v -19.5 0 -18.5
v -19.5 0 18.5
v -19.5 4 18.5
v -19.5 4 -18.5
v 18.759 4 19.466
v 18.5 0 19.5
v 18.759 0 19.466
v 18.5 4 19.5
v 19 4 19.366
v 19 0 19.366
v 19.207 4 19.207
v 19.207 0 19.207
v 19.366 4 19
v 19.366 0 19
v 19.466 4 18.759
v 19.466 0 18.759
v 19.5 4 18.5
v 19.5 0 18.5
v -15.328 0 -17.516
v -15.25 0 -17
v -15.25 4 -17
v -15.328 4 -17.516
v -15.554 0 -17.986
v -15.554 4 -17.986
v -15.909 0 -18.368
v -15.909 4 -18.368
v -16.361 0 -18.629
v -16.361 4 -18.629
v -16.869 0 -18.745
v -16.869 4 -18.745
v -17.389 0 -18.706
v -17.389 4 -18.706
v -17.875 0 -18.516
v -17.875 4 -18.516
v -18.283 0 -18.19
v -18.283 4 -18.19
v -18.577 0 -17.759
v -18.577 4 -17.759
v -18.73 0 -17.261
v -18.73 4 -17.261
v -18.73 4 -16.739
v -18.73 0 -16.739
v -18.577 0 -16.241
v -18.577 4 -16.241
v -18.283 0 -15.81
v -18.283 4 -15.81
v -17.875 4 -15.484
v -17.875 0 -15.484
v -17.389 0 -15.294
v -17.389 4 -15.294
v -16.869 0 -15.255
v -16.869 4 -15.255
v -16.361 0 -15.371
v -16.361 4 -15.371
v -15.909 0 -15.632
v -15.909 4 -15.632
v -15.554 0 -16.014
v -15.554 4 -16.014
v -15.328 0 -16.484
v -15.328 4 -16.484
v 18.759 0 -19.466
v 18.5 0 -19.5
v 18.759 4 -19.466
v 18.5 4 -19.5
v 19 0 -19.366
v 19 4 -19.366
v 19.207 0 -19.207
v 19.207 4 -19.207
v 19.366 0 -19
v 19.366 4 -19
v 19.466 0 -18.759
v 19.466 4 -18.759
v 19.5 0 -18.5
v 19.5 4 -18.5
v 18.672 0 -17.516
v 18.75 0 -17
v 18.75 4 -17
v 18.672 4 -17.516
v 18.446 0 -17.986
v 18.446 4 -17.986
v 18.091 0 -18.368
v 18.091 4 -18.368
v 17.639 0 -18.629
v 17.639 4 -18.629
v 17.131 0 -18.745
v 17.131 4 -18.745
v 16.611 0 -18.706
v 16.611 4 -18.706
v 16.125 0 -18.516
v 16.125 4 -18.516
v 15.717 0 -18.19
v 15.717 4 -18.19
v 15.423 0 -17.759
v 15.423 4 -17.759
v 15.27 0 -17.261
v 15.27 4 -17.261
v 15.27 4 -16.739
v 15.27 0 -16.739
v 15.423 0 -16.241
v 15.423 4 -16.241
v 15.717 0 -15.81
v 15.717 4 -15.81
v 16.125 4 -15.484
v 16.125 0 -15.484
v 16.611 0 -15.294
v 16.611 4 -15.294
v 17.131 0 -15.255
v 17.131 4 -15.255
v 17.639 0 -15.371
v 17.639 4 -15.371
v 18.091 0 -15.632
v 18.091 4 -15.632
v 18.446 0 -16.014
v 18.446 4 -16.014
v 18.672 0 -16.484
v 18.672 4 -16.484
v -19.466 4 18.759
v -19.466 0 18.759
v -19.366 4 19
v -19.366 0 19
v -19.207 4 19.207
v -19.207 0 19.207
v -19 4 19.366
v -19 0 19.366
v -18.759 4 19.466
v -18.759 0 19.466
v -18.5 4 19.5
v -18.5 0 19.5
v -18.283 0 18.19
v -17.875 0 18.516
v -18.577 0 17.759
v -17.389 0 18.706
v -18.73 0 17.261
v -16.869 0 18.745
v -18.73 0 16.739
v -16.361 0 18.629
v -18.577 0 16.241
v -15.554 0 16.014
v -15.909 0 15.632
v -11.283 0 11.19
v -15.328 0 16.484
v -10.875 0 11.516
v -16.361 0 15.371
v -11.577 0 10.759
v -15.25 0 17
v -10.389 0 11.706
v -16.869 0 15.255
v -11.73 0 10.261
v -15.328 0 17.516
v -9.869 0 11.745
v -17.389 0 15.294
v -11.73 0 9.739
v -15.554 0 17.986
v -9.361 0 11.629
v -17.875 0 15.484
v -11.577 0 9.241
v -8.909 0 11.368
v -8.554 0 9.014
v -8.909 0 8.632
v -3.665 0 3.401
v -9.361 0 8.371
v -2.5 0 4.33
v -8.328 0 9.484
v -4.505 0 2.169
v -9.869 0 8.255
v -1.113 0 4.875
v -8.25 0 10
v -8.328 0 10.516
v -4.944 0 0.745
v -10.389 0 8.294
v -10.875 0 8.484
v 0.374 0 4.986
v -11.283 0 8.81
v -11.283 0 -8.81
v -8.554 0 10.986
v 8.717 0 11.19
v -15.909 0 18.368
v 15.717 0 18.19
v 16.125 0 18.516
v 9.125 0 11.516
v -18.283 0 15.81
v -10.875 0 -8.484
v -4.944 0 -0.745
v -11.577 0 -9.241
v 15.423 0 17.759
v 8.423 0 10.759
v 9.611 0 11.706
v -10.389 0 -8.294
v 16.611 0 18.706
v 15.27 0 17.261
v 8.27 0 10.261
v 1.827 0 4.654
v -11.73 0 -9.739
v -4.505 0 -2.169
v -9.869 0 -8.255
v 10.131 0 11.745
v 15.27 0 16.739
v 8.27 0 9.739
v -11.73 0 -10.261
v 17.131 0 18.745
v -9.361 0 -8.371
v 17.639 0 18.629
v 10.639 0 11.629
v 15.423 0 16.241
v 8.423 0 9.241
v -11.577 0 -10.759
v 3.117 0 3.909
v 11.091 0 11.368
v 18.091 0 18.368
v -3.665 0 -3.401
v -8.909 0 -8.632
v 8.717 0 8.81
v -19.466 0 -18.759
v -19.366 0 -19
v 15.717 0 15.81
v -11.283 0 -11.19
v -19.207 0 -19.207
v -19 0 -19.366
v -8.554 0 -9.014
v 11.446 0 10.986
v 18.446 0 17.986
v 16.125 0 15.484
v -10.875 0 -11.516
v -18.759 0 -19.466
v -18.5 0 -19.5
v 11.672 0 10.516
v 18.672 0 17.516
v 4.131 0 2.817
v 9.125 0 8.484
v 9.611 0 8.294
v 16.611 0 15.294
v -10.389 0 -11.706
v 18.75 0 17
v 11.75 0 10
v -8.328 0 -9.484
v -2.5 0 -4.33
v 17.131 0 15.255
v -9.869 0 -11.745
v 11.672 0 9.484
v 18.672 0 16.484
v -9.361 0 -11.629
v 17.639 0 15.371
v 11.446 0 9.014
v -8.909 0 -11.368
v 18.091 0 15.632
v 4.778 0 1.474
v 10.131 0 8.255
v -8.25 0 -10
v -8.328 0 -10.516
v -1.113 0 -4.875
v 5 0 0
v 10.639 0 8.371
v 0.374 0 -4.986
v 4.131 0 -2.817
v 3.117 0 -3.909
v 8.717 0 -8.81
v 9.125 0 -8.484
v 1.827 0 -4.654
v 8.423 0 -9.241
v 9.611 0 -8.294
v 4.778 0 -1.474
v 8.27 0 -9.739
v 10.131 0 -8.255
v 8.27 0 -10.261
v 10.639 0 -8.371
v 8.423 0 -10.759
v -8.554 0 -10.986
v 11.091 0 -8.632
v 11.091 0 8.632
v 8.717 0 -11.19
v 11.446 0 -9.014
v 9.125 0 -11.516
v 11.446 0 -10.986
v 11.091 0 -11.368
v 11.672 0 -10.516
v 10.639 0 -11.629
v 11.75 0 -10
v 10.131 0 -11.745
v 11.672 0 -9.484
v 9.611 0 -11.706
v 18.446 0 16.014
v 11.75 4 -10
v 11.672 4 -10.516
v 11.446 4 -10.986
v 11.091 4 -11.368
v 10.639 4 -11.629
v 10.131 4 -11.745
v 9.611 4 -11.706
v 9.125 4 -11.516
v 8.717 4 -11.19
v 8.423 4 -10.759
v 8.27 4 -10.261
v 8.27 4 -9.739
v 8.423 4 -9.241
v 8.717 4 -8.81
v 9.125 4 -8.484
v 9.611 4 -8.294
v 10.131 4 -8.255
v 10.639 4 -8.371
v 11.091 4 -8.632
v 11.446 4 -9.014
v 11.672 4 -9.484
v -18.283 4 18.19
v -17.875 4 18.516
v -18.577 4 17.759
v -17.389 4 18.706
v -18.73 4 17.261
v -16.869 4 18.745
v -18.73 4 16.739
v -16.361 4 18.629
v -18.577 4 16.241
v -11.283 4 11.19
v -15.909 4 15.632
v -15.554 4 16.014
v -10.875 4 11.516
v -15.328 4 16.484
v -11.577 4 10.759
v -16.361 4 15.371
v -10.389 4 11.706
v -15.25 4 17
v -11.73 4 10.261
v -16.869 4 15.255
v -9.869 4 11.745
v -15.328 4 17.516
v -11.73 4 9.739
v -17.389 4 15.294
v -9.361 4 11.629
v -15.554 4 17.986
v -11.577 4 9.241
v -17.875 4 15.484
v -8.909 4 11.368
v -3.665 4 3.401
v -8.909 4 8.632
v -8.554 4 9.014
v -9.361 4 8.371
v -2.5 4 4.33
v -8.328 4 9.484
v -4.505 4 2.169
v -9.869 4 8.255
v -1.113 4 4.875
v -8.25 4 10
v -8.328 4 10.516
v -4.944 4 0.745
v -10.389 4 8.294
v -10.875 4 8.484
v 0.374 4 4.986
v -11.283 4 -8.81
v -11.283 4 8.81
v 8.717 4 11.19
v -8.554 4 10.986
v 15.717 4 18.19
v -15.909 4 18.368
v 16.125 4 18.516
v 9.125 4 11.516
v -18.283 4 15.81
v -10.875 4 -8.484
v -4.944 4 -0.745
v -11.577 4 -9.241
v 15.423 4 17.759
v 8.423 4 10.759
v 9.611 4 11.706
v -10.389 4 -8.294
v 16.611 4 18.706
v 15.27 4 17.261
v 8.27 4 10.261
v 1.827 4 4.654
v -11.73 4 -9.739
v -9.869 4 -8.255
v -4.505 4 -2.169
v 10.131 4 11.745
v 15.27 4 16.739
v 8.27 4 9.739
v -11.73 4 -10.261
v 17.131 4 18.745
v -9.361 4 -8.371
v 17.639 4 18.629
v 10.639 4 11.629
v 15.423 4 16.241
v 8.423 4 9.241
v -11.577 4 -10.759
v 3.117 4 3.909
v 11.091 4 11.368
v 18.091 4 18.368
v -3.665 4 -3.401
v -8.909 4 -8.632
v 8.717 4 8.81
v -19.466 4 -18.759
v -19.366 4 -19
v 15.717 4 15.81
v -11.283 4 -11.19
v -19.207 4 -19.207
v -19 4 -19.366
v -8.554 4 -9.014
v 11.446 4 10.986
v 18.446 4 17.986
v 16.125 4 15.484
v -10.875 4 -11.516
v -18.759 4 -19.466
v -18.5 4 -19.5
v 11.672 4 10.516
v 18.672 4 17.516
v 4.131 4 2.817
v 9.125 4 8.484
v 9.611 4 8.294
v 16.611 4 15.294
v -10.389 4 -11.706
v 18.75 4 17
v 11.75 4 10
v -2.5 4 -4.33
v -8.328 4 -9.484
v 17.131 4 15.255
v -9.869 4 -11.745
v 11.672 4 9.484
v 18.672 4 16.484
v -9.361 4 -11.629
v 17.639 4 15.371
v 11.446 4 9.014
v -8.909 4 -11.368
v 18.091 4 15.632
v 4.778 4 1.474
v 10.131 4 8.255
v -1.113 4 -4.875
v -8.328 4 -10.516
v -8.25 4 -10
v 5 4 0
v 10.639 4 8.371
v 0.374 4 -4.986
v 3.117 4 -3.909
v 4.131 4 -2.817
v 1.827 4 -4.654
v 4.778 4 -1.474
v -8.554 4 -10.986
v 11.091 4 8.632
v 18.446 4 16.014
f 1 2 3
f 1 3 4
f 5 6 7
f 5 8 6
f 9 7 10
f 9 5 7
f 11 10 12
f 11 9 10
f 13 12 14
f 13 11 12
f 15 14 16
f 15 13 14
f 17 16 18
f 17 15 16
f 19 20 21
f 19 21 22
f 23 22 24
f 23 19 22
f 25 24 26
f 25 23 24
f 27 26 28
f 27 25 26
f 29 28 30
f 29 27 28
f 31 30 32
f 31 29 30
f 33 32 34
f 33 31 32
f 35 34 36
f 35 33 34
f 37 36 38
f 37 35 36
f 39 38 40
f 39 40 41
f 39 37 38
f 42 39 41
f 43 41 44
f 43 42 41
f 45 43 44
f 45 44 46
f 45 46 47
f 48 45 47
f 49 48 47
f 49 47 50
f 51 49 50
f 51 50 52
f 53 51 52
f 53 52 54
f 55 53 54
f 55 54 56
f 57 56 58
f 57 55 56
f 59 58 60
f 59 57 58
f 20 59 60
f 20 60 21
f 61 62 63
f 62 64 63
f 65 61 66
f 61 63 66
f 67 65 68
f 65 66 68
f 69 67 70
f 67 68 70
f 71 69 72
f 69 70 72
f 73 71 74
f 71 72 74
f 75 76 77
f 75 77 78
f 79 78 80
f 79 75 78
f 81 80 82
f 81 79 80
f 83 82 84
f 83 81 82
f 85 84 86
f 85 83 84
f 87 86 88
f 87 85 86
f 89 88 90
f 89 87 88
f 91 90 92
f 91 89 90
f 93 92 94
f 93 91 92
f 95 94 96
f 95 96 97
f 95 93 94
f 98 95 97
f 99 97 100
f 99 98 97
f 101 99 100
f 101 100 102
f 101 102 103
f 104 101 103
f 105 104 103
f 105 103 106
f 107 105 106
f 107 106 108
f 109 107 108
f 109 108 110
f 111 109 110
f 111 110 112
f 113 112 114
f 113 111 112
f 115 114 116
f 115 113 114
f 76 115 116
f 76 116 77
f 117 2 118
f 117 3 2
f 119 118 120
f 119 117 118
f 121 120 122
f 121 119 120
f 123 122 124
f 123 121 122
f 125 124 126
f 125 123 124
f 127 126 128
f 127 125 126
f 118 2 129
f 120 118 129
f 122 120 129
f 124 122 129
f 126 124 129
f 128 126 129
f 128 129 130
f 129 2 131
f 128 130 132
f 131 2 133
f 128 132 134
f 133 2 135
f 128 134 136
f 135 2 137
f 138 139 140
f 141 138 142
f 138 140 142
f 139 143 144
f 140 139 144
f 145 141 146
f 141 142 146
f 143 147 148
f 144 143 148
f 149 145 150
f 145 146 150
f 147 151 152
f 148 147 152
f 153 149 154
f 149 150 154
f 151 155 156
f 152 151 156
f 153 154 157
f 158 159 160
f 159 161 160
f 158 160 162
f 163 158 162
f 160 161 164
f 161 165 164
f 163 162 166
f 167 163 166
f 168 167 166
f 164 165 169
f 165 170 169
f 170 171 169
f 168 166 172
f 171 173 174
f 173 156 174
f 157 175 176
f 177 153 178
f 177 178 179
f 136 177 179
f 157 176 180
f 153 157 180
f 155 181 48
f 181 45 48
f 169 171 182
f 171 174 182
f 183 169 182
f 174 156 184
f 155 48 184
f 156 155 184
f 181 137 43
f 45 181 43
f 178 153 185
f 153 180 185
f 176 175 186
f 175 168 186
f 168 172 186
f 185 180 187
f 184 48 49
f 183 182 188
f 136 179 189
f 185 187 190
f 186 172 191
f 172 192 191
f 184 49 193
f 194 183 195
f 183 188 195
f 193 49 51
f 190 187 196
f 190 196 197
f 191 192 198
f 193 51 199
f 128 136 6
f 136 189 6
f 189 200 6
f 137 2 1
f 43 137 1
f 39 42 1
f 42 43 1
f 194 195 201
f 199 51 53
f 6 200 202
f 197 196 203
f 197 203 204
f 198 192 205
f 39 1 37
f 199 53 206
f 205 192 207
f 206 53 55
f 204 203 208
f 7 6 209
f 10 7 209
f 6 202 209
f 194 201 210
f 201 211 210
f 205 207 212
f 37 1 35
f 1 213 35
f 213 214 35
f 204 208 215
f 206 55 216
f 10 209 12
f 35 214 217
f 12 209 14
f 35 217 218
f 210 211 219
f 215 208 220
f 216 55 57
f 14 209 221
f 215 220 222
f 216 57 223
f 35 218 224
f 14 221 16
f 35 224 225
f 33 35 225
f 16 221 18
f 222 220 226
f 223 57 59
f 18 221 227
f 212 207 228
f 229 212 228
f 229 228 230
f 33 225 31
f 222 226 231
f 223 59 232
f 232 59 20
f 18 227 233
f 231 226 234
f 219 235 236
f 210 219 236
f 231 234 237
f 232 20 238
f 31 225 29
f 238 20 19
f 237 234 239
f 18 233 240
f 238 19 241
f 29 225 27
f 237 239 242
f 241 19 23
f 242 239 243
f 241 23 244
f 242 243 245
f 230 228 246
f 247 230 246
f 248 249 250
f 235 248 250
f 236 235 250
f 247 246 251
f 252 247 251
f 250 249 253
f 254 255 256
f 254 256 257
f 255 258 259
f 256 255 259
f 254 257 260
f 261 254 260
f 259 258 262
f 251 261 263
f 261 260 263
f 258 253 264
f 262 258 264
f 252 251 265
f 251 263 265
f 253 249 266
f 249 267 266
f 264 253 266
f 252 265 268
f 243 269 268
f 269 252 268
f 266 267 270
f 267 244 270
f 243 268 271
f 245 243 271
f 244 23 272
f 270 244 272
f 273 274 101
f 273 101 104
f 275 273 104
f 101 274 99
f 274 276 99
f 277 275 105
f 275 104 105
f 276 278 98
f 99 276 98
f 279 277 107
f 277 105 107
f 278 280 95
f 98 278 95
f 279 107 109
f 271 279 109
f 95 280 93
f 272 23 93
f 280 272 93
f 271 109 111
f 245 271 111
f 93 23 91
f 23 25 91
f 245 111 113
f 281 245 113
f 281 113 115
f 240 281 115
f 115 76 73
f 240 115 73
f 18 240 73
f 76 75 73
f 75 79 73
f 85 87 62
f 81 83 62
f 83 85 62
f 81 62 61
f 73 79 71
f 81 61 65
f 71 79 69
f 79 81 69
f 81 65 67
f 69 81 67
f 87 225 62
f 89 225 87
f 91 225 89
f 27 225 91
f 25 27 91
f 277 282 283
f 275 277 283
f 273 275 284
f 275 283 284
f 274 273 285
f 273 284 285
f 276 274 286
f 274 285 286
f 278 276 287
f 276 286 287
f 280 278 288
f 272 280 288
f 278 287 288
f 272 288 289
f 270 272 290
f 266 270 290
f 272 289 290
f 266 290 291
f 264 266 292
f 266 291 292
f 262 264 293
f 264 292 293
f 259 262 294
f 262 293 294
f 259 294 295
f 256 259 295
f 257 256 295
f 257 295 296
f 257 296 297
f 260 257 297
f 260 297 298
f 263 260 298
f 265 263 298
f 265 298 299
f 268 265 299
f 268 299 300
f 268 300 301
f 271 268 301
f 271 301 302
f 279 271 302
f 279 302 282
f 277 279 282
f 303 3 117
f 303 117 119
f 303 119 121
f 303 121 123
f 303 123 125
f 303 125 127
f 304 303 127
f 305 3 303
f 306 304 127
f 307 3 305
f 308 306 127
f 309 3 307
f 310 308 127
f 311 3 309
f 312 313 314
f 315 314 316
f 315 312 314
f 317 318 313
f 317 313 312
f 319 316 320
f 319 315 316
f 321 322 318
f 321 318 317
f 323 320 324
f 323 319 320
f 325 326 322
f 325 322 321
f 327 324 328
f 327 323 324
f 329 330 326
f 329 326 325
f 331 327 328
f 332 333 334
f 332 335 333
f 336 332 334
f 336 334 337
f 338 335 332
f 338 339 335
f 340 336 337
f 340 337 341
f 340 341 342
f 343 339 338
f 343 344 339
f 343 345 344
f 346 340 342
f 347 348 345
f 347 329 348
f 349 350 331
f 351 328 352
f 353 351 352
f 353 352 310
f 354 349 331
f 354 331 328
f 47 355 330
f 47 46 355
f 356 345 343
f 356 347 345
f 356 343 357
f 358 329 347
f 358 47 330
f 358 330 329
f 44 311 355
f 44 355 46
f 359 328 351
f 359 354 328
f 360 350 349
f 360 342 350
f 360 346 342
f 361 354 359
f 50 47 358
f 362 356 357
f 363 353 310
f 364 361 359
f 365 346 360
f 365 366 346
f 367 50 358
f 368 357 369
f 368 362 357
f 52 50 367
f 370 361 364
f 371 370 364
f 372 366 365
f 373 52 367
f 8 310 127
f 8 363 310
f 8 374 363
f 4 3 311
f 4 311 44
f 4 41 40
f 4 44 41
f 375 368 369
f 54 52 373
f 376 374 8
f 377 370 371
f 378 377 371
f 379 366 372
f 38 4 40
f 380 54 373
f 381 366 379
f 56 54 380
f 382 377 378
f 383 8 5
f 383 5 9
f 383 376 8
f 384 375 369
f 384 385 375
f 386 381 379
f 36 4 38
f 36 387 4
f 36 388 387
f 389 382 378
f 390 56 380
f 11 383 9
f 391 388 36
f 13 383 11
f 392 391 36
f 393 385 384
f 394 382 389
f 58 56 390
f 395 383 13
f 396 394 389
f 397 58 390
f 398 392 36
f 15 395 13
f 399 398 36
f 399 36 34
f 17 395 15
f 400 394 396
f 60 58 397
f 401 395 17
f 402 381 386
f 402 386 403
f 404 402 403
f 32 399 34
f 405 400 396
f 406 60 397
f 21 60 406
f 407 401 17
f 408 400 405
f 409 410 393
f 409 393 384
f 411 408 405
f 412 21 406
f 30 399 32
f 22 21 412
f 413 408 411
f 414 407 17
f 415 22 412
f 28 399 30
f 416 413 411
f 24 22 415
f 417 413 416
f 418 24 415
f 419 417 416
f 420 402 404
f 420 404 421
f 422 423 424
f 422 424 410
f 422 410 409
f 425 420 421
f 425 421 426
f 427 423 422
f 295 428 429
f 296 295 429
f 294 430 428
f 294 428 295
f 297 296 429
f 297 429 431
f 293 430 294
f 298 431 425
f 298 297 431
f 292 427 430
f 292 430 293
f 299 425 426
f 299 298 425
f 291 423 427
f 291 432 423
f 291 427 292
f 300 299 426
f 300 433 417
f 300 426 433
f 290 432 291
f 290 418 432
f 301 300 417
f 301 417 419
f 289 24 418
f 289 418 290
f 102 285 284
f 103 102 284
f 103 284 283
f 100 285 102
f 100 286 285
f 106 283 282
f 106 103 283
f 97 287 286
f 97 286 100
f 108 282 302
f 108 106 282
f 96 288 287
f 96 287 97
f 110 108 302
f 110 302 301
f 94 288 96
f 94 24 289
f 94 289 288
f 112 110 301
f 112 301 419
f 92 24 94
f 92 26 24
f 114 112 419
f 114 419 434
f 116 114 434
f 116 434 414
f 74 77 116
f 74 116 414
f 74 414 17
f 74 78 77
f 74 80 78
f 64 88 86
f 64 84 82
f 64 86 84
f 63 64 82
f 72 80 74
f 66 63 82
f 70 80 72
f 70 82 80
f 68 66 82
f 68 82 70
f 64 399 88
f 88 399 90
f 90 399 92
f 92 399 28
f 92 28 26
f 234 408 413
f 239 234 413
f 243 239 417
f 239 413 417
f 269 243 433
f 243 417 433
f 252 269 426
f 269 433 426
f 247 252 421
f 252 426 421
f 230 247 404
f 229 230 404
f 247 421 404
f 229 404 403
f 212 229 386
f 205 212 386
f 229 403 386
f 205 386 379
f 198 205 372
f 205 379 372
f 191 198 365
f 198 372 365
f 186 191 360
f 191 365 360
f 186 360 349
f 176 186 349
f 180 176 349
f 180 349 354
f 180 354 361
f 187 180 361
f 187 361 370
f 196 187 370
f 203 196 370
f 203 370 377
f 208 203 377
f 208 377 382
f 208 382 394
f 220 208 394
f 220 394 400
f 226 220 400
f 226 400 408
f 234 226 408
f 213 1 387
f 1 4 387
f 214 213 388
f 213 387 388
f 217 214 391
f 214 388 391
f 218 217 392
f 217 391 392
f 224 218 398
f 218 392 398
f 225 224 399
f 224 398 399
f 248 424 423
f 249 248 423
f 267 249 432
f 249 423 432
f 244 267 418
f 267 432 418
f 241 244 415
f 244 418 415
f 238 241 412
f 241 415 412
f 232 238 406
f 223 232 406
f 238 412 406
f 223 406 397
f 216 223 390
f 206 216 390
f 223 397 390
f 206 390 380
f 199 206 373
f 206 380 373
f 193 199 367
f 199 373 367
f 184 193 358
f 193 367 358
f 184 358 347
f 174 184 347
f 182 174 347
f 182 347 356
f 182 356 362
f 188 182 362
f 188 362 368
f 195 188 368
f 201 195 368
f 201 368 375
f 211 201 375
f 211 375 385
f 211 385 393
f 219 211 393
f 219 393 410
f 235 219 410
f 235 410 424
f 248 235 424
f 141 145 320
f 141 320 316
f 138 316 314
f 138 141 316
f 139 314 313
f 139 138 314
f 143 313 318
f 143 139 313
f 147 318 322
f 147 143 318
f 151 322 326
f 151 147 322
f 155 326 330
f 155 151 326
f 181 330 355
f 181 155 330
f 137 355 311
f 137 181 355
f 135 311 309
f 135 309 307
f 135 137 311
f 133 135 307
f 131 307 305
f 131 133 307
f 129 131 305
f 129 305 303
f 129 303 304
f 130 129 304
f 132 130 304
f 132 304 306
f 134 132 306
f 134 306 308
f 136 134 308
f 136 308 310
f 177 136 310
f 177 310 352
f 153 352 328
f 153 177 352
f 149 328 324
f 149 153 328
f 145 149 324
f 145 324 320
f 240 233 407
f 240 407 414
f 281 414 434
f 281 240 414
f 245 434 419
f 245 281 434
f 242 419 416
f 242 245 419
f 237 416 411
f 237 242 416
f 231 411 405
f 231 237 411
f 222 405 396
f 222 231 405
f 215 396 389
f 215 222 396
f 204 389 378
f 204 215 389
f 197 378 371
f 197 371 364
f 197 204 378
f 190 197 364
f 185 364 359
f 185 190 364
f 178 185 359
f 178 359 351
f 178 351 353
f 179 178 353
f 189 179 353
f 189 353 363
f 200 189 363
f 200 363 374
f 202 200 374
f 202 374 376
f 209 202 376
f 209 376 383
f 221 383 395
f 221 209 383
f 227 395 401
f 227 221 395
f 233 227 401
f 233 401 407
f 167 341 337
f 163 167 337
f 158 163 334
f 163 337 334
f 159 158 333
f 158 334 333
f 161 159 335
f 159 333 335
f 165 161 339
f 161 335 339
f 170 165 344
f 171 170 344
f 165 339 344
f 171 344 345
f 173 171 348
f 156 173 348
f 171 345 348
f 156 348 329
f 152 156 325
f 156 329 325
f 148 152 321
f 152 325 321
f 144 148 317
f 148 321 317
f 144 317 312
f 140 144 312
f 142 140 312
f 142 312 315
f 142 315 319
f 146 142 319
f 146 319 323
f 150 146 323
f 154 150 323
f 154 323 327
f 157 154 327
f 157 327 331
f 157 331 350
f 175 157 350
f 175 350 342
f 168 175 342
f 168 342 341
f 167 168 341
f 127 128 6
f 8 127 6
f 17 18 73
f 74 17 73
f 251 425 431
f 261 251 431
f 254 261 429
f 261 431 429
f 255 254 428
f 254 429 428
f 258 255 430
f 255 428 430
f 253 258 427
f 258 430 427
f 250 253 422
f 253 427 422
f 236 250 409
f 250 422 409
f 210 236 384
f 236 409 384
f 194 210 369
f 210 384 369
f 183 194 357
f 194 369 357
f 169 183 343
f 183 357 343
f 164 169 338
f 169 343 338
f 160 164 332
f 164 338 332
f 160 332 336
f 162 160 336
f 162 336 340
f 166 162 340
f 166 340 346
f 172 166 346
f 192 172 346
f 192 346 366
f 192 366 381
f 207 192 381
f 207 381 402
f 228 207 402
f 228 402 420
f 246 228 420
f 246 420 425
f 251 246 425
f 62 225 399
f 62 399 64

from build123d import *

# Parameters (mm, degrees)
SKETCH1_W           = 39
SKETCH1_H           = 39
SKETCH1_R           = 1.75
BOSS_EXTRUDE1_DEPTH = 4
SKETCH2_R           = 1.75
CUT_EXTRUDE1_DEPTH  = 11
FILLET1_R           = 1
CUT_EXTRUDE2_REACH  = 6
SKETCH3_R           = 5


with BuildPart() as part:
    # Sketch1 → Boss-Extrude1 (new body)
    with BuildSketch(Plane(origin=(0, 0, 0), x_dir=(1, 0, 0), z_dir=(0, 1, 0))):
        Rectangle(SKETCH1_W, SKETCH1_H)
        with Locations((17, 17)):
            Circle(SKETCH1_R, mode=Mode.SUBTRACT)
        with Locations((17, -17)):
            Circle(SKETCH1_R, mode=Mode.SUBTRACT)
        with Locations((-17, -17)):
            Circle(SKETCH1_R, mode=Mode.SUBTRACT)
        with Locations((-17, 17)):
            Circle(SKETCH1_R, mode=Mode.SUBTRACT)
    extrude(amount=BOSS_EXTRUDE1_DEPTH)

    # Sketch2 → Cut-Extrude1 (cut)
    with BuildSketch(Plane(origin=(0, 4, 0), x_dir=(1, 0, 0), z_dir=(0, 1, 0))):
        with Locations((10, 10)):
            Circle(SKETCH2_R)
        with Locations((10, -10)):
            Circle(SKETCH2_R)
        with Locations((-10, -10)):
            Circle(SKETCH2_R)
        with Locations((-10, 10)):
            Circle(SKETCH2_R)
    extrude(amount=-CUT_EXTRUDE1_DEPTH, mode=Mode.SUBTRACT)

    # Fillet1
    fillet1_edges = [part.edges().sort_by_distance(p)[0] for p in [
        (19.5, 2, 19.5),
        (-19.5, 2, 19.5),
        (-19.5, 2, -19.5),
        (19.5, 2, -19.5),
    ]]
    fillet(fillet1_edges, radius=FILLET1_R)

    # Sketch3 → Cut-Extrude2 (cut, up to next)
    with BuildSketch(Plane(origin=(0, 4, 0), x_dir=(1, 0, 0), z_dir=(0, 1, 0)), mode=Mode.PRIVATE) as cut_extrude2_sk1:
        Circle(SKETCH3_R)
    cut_extrude2_tool1 = extrude(cut_extrude2_sk1.sketch, amount=-CUT_EXTRUDE2_REACH, mode=Mode.PRIVATE) & part.part
    add(cut_extrude2_tool1.solids().sort_by_distance((0, 4, 0))[0], mode=Mode.SUBTRACT)


solid = part.part
